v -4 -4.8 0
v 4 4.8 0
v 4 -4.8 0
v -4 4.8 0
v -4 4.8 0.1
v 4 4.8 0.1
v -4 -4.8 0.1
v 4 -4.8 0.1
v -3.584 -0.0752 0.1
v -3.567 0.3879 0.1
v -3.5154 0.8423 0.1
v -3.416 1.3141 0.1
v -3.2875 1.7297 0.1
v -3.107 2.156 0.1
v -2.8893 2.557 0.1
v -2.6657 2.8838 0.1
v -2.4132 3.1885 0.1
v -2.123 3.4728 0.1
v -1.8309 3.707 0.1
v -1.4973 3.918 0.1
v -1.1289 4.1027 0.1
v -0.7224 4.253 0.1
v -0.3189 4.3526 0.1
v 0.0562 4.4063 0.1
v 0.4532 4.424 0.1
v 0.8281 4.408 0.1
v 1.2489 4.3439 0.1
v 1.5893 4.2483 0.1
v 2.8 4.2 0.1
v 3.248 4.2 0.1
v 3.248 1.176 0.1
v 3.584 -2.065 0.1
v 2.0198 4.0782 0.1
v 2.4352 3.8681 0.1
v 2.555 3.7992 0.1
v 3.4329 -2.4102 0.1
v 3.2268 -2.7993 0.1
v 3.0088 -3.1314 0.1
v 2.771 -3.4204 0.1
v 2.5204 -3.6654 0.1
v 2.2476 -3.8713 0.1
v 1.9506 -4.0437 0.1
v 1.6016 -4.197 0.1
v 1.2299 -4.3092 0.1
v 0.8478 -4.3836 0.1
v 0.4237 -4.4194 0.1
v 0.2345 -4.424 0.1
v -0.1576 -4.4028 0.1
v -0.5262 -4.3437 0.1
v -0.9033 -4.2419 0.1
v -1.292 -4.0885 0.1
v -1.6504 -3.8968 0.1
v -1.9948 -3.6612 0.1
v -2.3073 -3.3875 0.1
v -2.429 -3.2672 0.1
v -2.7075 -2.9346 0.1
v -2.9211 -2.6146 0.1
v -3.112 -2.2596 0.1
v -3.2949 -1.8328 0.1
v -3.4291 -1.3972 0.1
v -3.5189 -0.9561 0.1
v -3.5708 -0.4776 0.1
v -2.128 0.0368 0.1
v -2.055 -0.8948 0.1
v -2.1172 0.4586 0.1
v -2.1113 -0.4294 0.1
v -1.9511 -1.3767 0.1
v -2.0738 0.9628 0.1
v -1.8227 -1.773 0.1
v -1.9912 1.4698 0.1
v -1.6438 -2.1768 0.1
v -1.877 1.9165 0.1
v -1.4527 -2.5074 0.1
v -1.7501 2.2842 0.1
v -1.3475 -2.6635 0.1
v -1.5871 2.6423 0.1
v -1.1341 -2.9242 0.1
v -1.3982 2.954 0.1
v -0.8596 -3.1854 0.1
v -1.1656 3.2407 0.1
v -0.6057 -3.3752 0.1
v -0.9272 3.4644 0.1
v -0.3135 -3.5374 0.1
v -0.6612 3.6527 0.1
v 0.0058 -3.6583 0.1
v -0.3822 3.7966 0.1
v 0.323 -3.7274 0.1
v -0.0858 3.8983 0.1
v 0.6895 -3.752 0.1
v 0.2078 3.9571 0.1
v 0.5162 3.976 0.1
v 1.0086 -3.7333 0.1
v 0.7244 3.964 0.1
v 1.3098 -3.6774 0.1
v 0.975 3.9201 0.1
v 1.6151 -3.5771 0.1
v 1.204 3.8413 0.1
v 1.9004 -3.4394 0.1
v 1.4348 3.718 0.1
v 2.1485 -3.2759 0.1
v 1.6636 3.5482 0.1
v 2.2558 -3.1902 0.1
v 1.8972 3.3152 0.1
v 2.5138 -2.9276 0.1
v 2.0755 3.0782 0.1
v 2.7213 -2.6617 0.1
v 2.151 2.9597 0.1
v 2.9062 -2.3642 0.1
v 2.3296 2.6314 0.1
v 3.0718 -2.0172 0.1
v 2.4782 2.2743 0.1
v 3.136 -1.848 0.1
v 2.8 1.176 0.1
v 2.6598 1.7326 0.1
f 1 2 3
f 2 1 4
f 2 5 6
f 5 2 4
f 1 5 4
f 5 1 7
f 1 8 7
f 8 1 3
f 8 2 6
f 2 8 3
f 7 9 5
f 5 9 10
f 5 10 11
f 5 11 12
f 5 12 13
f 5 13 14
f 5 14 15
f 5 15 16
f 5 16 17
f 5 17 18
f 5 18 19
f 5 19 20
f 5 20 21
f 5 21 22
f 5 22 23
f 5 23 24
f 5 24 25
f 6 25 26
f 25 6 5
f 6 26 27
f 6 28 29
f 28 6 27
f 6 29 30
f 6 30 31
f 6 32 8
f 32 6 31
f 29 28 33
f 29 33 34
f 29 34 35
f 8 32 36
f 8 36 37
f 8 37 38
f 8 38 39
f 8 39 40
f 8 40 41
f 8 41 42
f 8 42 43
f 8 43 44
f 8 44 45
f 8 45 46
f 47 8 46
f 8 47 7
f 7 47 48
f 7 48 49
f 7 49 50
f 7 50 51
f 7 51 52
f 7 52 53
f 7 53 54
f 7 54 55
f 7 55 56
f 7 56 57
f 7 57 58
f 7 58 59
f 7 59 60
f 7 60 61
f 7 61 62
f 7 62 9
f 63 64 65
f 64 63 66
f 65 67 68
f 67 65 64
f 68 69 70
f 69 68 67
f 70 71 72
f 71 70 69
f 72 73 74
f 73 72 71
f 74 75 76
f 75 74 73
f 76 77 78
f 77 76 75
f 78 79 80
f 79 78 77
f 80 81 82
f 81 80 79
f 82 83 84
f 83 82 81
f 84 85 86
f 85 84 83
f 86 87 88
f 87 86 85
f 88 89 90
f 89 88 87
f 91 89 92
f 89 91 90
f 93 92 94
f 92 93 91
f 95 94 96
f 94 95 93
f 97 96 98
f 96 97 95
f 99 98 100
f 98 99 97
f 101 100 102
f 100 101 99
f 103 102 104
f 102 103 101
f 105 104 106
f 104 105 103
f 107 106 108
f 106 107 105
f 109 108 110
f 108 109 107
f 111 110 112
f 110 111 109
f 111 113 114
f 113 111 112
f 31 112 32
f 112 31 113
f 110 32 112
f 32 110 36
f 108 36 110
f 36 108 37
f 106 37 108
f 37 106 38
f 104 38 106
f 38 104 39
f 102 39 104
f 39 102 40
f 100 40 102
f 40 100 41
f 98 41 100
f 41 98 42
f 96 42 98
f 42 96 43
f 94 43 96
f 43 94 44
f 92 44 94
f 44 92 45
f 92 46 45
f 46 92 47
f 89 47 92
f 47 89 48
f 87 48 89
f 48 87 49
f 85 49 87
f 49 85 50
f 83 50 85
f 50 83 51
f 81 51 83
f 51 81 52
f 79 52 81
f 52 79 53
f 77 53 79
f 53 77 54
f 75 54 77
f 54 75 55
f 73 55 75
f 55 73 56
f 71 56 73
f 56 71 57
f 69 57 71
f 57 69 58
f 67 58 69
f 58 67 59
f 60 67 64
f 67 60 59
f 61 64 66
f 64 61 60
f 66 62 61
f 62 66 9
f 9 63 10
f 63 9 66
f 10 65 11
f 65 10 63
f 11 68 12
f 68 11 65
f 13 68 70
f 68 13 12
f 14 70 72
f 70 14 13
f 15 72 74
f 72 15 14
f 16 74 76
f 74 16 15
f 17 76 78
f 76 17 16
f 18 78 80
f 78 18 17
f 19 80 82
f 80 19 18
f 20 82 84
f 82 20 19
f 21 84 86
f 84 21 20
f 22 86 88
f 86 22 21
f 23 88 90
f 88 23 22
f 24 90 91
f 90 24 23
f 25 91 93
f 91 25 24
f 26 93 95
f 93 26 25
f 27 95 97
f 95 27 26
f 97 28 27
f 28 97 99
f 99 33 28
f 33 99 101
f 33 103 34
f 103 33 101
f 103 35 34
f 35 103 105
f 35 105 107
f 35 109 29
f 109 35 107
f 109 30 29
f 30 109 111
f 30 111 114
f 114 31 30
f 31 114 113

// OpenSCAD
// file: ../p/box5-12.scad
use <../lib.scad>
function ldraw_lib__box5_12() = [
// 0 Box with 5 Faces without Any Edges
// 0 Name: box5-12.dat
// 0 Author: Chris Dee [cwdee]
// 0 !LDRAW_ORG Primitive UPDATE 2009-02
// 0 !LICENSE Licensed under CC BY 2.0 and CC BY 4.0 : see CAreadme.txt
// 
// 0 BFC CERTIFY CCW
  [0,"BFC","CERTIFY"],
  [0,"BFC","CCW"],
// 
// 0 !HISTORY 2009-09-03 [PTadmin] Official Update 2009-02
// 
// 
// 4 16 1 1 1 1 1 -1 -1 1 -1 -1 1 1
  [4,16,1,1,1,1,1,-1,-1,1,-1,-1,1,1],
// 4 16 -1 0 1 1 0 1 1 1 1 -1 1 1
  [4,16,-1,0,1,1,0,1,1,1,1,-1,1,1],
// 4 16 -1 0 -1 -1 0 1 -1 1 1 -1 1 -1
  [4,16,-1,0,-1,-1,0,1,-1,1,1,-1,1,-1],
// 4 16 1 0 -1 -1 0 -1 -1 1 -1 1 1 -1
  [4,16,1,0,-1,-1,0,-1,-1,1,-1,1,1,-1],
// 4 16 1 0 1 1 0 -1 1 1 -1 1 1 1
  [4,16,1,0,1,1,0,-1,1,1,-1,1,1,1],
// 0
];
makepoly(ldraw_lib__box5_12(), line=0.2);
// main file
use <../lib.scad>
use <../p/box5-12.scad>
function ldraw_lib__4162510d() = [
// 0 Sticker  1.2 x  1.0 with White "C" on Light Grey Background
// 0 Name: 4162510d.dat
// 0 Author: Massimo Maso [Sirio]
// 0 !LDRAW_ORG Part UPDATE 2022-05
// 0 !LICENSE Licensed under CC BY 2.0 and CC BY 4.0 : see CAreadme.txt
// 
// 0 BFC CERTIFY CCW
  [0,"BFC","CERTIFY"],
  [0,"BFC","CCW"],
// 
// 0 !KEYWORDS Biplane, Camel, Sculptures, Set 3451, Sopwith
// 
// 0 !HISTORY 2022-09-15 [PTadmin] Official Update 2022-05
// 
// 
// 0 // Primitives
// 1 16 0 -.25 0 10 0 0 0 .25 0 0 0 12 box5-12.dat
  [1,16,0,-.25,0,10,0,0,0,.25,0,0,0,12, ldraw_lib__box5_12()],
// 0 // Top faces
// 0 // Grey faces
// 3 7 -10 -.25 -12 -8.96 -.25 -.1881 -10 -.25 12
  [3,7,-10,-.25,-12,-8.96,-.25,-.1881,-10,-.25,12],
// 3 7 -10 -.25 12 -8.96 -.25 -.1881 -8.9175 -.25 .9698
  [3,7,-10,-.25,12,-8.96,-.25,-.1881,-8.9175,-.25,.9698],
// 3 7 -10 -.25 12 -8.9175 -.25 .9698 -8.7884 -.25 2.1057
  [3,7,-10,-.25,12,-8.9175,-.25,.9698,-8.7884,-.25,2.1057],
// 3 7 -10 -.25 12 -8.7884 -.25 2.1057 -8.5399 -.25 3.2852
  [3,7,-10,-.25,12,-8.7884,-.25,2.1057,-8.5399,-.25,3.2852],
// 3 7 -10 -.25 12 -8.5399 -.25 3.2852 -8.2188 -.25 4.3243
  [3,7,-10,-.25,12,-8.5399,-.25,3.2852,-8.2188,-.25,4.3243],
// 3 7 -10 -.25 12 -8.2188 -.25 4.3243 -7.7675 -.25 5.39
  [3,7,-10,-.25,12,-8.2188,-.25,4.3243,-7.7675,-.25,5.39],
// 3 7 -10 -.25 12 -7.7675 -.25 5.39 -7.2233 -.25 6.3924
  [3,7,-10,-.25,12,-7.7675,-.25,5.39,-7.2233,-.25,6.3924],
// 3 7 -10 -.25 12 -7.2233 -.25 6.3924 -6.6643 -.25 7.2094
  [3,7,-10,-.25,12,-7.2233,-.25,6.3924,-6.6643,-.25,7.2094],
// 3 7 -10 -.25 12 -6.6643 -.25 7.2094 -6.0331 -.25 7.9713
  [3,7,-10,-.25,12,-6.6643,-.25,7.2094,-6.0331,-.25,7.9713],
// 3 7 -10 -.25 12 -6.0331 -.25 7.9713 -5.3075 -.25 8.6821
  [3,7,-10,-.25,12,-6.0331,-.25,7.9713,-5.3075,-.25,8.6821],
// 3 7 -10 -.25 12 -5.3075 -.25 8.6821 -4.5773 -.25 9.2675
  [3,7,-10,-.25,12,-5.3075,-.25,8.6821,-4.5773,-.25,9.2675],
// 3 7 -10 -.25 12 -4.5773 -.25 9.2675 -3.7433 -.25 9.795
  [3,7,-10,-.25,12,-4.5773,-.25,9.2675,-3.7433,-.25,9.795],
// 3 7 -10 -.25 12 -3.7433 -.25 9.795 -2.8223 -.25 10.2567
  [3,7,-10,-.25,12,-3.7433,-.25,9.795,-2.8223,-.25,10.2567],
// 3 7 -10 -.25 12 -2.8223 -.25 10.2567 -1.8059 -.25 10.6326
  [3,7,-10,-.25,12,-2.8223,-.25,10.2567,-1.8059,-.25,10.6326],
// 3 7 -10 -.25 12 -1.8059 -.25 10.6326 -.7972 -.25 10.8814
  [3,7,-10,-.25,12,-1.8059,-.25,10.6326,-.7972,-.25,10.8814],
// 3 7 -10 -.25 12 -.7972 -.25 10.8814 .1406 -.25 11.0158
  [3,7,-10,-.25,12,-.7972,-.25,10.8814,.1406,-.25,11.0158],
// 3 7 -10 -.25 12 .1406 -.25 11.0158 1.1331 -.25 11.06
  [3,7,-10,-.25,12,.1406,-.25,11.0158,1.1331,-.25,11.06],
// 4 7 -10 -.25 12 1.1331 -.25 11.06 2.0703 -.25 11.0199 10 -.25 12
  [4,7,-10,-.25,12,1.1331,-.25,11.06,2.0703,-.25,11.0199,10,-.25,12],
// 3 7 10 -.25 12 2.0703 -.25 11.0199 3.1222 -.25 10.8597
  [3,7,10,-.25,12,2.0703,-.25,11.0199,3.1222,-.25,10.8597],
// 4 7 10 -.25 12 3.1222 -.25 10.8597 3.9733 -.25 10.6208 7 -.25 10.5
  [4,7,10,-.25,12,3.1222,-.25,10.8597,3.9733,-.25,10.6208,7,-.25,10.5],
// 3 7 10 -.25 12 7 -.25 10.5 8.12 -.25 10.5
  [3,7,10,-.25,12,7,-.25,10.5,8.12,-.25,10.5],
// 3 7 10 -.25 12 8.12 -.25 10.5 8.12 -.25 2.94
  [3,7,10,-.25,12,8.12,-.25,10.5,8.12,-.25,2.94],
// 4 7 10 -.25 12 8.12 -.25 2.94 8.96 -.25 -5.1625 10 -.25 -12
  [4,7,10,-.25,12,8.12,-.25,2.94,8.96,-.25,-5.1625,10,-.25,-12],
// 3 7 7 -.25 10.5 3.9733 -.25 10.6208 5.0494 -.25 10.1956
  [3,7,7,-.25,10.5,3.9733,-.25,10.6208,5.0494,-.25,10.1956],
// 3 7 7 -.25 10.5 5.0494 -.25 10.1956 6.088 -.25 9.6703
  [3,7,7,-.25,10.5,5.0494,-.25,10.1956,6.088,-.25,9.6703],
// 3 7 7 -.25 10.5 6.088 -.25 9.6703 6.3875 -.25 9.4981
  [3,7,7,-.25,10.5,6.088,-.25,9.6703,6.3875,-.25,9.4981],
// 3 7 10 -.25 -12 8.96 -.25 -5.1625 8.5822 -.25 -6.0256
  [3,7,10,-.25,-12,8.96,-.25,-5.1625,8.5822,-.25,-6.0256],
// 3 7 10 -.25 -12 8.5822 -.25 -6.0256 8.0669 -.25 -6.9983
  [3,7,10,-.25,-12,8.5822,-.25,-6.0256,8.0669,-.25,-6.9983],
// 3 7 10 -.25 -12 8.0669 -.25 -6.9983 7.5221 -.25 -7.8284
  [3,7,10,-.25,-12,8.0669,-.25,-6.9983,7.5221,-.25,-7.8284],
// 3 7 10 -.25 -12 7.5221 -.25 -7.8284 6.9275 -.25 -8.5509
  [3,7,10,-.25,-12,7.5221,-.25,-7.8284,6.9275,-.25,-8.5509],
// 3 7 10 -.25 -12 6.9275 -.25 -8.5509 6.3009 -.25 -9.1635
  [3,7,10,-.25,-12,6.9275,-.25,-8.5509,6.3009,-.25,-9.1635],
// 3 7 10 -.25 -12 6.3009 -.25 -9.1635 5.6191 -.25 -9.6783
  [3,7,10,-.25,-12,6.3009,-.25,-9.1635,5.6191,-.25,-9.6783],
// 3 7 10 -.25 -12 5.6191 -.25 -9.6783 4.8764 -.25 -10.1092
  [3,7,10,-.25,-12,5.6191,-.25,-9.6783,4.8764,-.25,-10.1092],
// 3 7 10 -.25 -12 4.8764 -.25 -10.1092 4.0039 -.25 -10.4925
  [3,7,10,-.25,-12,4.8764,-.25,-10.1092,4.0039,-.25,-10.4925],
// 3 7 10 -.25 -12 4.0039 -.25 -10.4925 3.0747 -.25 -10.773
  [3,7,10,-.25,-12,4.0039,-.25,-10.4925,3.0747,-.25,-10.773],
// 3 7 10 -.25 -12 3.0747 -.25 -10.773 2.1195 -.25 -10.9589
  [3,7,10,-.25,-12,3.0747,-.25,-10.773,2.1195,-.25,-10.9589],
// 3 7 10 -.25 -12 2.1195 -.25 -10.9589 1.0592 -.25 -11.0485
  [3,7,10,-.25,-12,2.1195,-.25,-10.9589,1.0592,-.25,-11.0485],
// 4 7 10 -.25 -12 1.0592 -.25 -11.0485 .5863 -.25 -11.06 -10 -.25 -12
  [4,7,10,-.25,-12,1.0592,-.25,-11.0485,.5863,-.25,-11.06,-10,-.25,-12],
// 3 7 -10 -.25 -12 .5863 -.25 -11.06 -.394 -.25 -11.0071
  [3,7,-10,-.25,-12,.5863,-.25,-11.06,-.394,-.25,-11.0071],
// 3 7 -10 -.25 -12 -.394 -.25 -11.0071 -1.3154 -.25 -10.8592
  [3,7,-10,-.25,-12,-.394,-.25,-11.0071,-1.3154,-.25,-10.8592],
// 3 7 -10 -.25 -12 -1.3154 -.25 -10.8592 -2.2583 -.25 -10.6047
  [3,7,-10,-.25,-12,-1.3154,-.25,-10.8592,-2.2583,-.25,-10.6047],
// 3 7 -10 -.25 -12 -2.2583 -.25 -10.6047 -3.2301 -.25 -10.2212
  [3,7,-10,-.25,-12,-2.2583,-.25,-10.6047,-3.2301,-.25,-10.2212],
// 3 7 -10 -.25 -12 -3.2301 -.25 -10.2212 -4.1261 -.25 -9.742
  [3,7,-10,-.25,-12,-3.2301,-.25,-10.2212,-4.1261,-.25,-9.742],
// 3 7 -10 -.25 -12 -4.1261 -.25 -9.742 -4.987 -.25 -9.153
  [3,7,-10,-.25,-12,-4.1261,-.25,-9.742,-4.987,-.25,-9.153],
// 3 7 -10 -.25 -12 -4.987 -.25 -9.153 -5.7683 -.25 -8.4688
  [3,7,-10,-.25,-12,-4.987,-.25,-9.153,-5.7683,-.25,-8.4688],
// 3 7 -10 -.25 -12 -5.7683 -.25 -8.4688 -6.0725 -.25 -8.1681
  [3,7,-10,-.25,-12,-5.7683,-.25,-8.4688,-6.0725,-.25,-8.1681],
// 3 7 -10 -.25 -12 -6.0725 -.25 -8.1681 -6.7687 -.25 -7.3364
  [3,7,-10,-.25,-12,-6.0725,-.25,-8.1681,-6.7687,-.25,-7.3364],
// 3 7 -10 -.25 -12 -6.7687 -.25 -7.3364 -7.3027 -.25 -6.5366
  [3,7,-10,-.25,-12,-6.7687,-.25,-7.3364,-7.3027,-.25,-6.5366],
// 3 7 -10 -.25 -12 -7.3027 -.25 -6.5366 -7.7799 -.25 -5.6489
  [3,7,-10,-.25,-12,-7.3027,-.25,-6.5366,-7.7799,-.25,-5.6489],
// 3 7 -10 -.25 -12 -7.7799 -.25 -5.6489 -8.2373 -.25 -4.5821
  [3,7,-10,-.25,-12,-7.7799,-.25,-5.6489,-8.2373,-.25,-4.5821],
// 3 7 -10 -.25 -12 -8.2373 -.25 -4.5821 -8.5727 -.25 -3.493
  [3,7,-10,-.25,-12,-8.2373,-.25,-4.5821,-8.5727,-.25,-3.493],
// 3 7 -10 -.25 -12 -8.5727 -.25 -3.493 -8.7972 -.25 -2.3903
  [3,7,-10,-.25,-12,-8.5727,-.25,-3.493,-8.7972,-.25,-2.3903],
// 3 7 -10 -.25 -12 -8.7972 -.25 -2.3903 -8.9271 -.25 -1.1939
  [3,7,-10,-.25,-12,-8.7972,-.25,-2.3903,-8.9271,-.25,-1.1939],
// 3 7 -10 -.25 -12 -8.9271 -.25 -1.1939 -8.96 -.25 -.1881
  [3,7,-10,-.25,-12,-8.9271,-.25,-1.1939,-8.96,-.25,-.1881],
// 4 7 -5.2931 -.25 1.1464 -5.32 -.25 .0919 -5.2783 -.25 -1.0734 -5.1375 -.25 -2.237
  [4,7,-5.2931,-.25,1.1464,-5.32,-.25,.0919,-5.2783,-.25,-1.0734,-5.1375,-.25,-2.237],
// 4 7 -5.2931 -.25 1.1464 -5.1375 -.25 -2.237 -4.8777 -.25 -3.4418 -5.1845 -.25 2.407
  [4,7,-5.2931,-.25,1.1464,-5.1375,-.25,-2.237,-4.8777,-.25,-3.4418,-5.1845,-.25,2.407],
// 4 7 -4.978 -.25 3.6744 -5.1845 -.25 2.407 -4.8777 -.25 -3.4418 -4.5568 -.25 -4.4325
  [4,7,-4.978,-.25,3.6744,-5.1845,-.25,2.407,-4.8777,-.25,-3.4418,-4.5568,-.25,-4.4325],
// 4 7 -4.978 -.25 3.6744 -4.5568 -.25 -4.4325 -4.1096 -.25 -5.442 -4.6926 -.25 4.7913
  [4,7,-4.978,-.25,3.6744,-4.5568,-.25,-4.4325,-4.1096,-.25,-5.442,-4.6926,-.25,4.7913],
// 4 7 -4.3753 -.25 5.7105 -4.6926 -.25 4.7913 -4.1096 -.25 -5.442 -3.6317 -.25 -6.2685
  [4,7,-4.3753,-.25,5.7105,-4.6926,-.25,4.7913,-4.1096,-.25,-5.442,-3.6317,-.25,-6.2685],
// 4 7 -4.3753 -.25 5.7105 -3.6317 -.25 -6.2685 -3.3688 -.25 -6.6588 -3.9677 -.25 6.6058
  [4,7,-4.3753,-.25,5.7105,-3.6317,-.25,-6.2685,-3.3688,-.25,-6.6588,-3.9677,-.25,6.6058],
// 4 7 -3.4956 -.25 7.385 -3.9677 -.25 6.6058 -3.3688 -.25 -6.6588 -2.8353 -.25 -7.3105
  [4,7,-3.4956,-.25,7.385,-3.9677,-.25,6.6058,-3.3688,-.25,-6.6588,-2.8353,-.25,-7.3105],
// 4 7 -3.4956 -.25 7.385 -2.8353 -.25 -7.3105 -2.1491 -.25 -7.9636 -2.9141 -.25 8.1017
  [4,7,-3.4956,-.25,7.385,-2.8353,-.25,-7.3105,-2.1491,-.25,-7.9636,-2.9141,-.25,8.1017],
// 4 7 -2.3181 -.25 8.661 -2.9141 -.25 8.1017 -2.1491 -.25 -7.9636 -1.5142 -.25 -8.438
  [4,7,-2.3181,-.25,8.661,-2.9141,-.25,8.1017,-2.1491,-.25,-7.9636,-1.5142,-.25,-8.438],
// 4 7 -2.3181 -.25 8.661 -1.5142 -.25 -8.438 -.7838 -.25 -8.8434 -1.6531 -.25 9.1317
  [4,7,-2.3181,-.25,8.661,-1.5142,-.25,-8.438,-.7838,-.25,-8.8434,-1.6531,-.25,9.1317],
// 4 7 -.9555 -.25 9.4914 -1.6531 -.25 9.1317 -.7838 -.25 -8.8434 .0145 -.25 -9.1458
  [4,7,-.9555,-.25,9.4914,-1.6531,-.25,9.1317,-.7838,-.25,-8.8434,.0145,-.25,-9.1458],
// 4 7 -.9555 -.25 9.4914 .0145 -.25 -9.1458 .8075 -.25 -9.3185 -.2145 -.25 9.7457
  [4,7,-.9555,-.25,9.4914,.0145,-.25,-9.1458,.8075,-.25,-9.3185,-.2145,-.25,9.7457],
// 4 7 .5194 -.25 9.8927 -.2145 -.25 9.7457 .8075 -.25 -9.3185 1.7238 -.25 -9.38
  [4,7,.5194,-.25,9.8927,-.2145,-.25,9.7457,.8075,-.25,-9.3185,1.7238,-.25,-9.38],
// 4 7 .5194 -.25 9.8927 1.7238 -.25 -9.38 2.5214 -.25 -9.3332 1.2906 -.25 9.94
  [4,7,.5194,-.25,9.8927,1.7238,-.25,-9.38,2.5214,-.25,-9.3332,1.2906,-.25,9.94],
// 4 7 1.8109 -.25 9.9099 1.2906 -.25 9.94 2.5214 -.25 -9.3332 3.2744 -.25 -9.1934
  [4,7,1.8109,-.25,9.9099,1.2906,-.25,9.94,2.5214,-.25,-9.3332,3.2744,-.25,-9.1934],
// 4 7 1.8109 -.25 9.9099 3.2744 -.25 -9.1934 4.0377 -.25 -8.9428 2.4376 -.25 9.8003
  [4,7,1.8109,-.25,9.9099,3.2744,-.25,-9.1934,4.0377,-.25,-8.9428,2.4376,-.25,9.8003],
// 4 7 3.01 -.25 9.6032 2.4376 -.25 9.8003 4.0377 -.25 -8.9428 4.7511 -.25 -8.5985
  [4,7,3.01,-.25,9.6032,2.4376,-.25,9.8003,4.0377,-.25,-8.9428,4.7511,-.25,-8.5985],
// 4 7 3.01 -.25 9.6032 4.7511 -.25 -8.5985 5.3712 -.25 -8.1897 3.587 -.25 9.2949
  [4,7,3.01,-.25,9.6032,4.7511,-.25,-8.5985,5.3712,-.25,-8.1897,3.587,-.25,9.2949],
// 4 7 4.159 -.25 8.8706 3.587 -.25 9.2949 5.3712 -.25 -8.1897 5.6394 -.25 -7.9756
  [4,7,4.159,-.25,8.8706,3.587,-.25,9.2949,5.3712,-.25,-8.1897,5.6394,-.25,-7.9756],
// 4 7 4.159 -.25 8.8706 5.6394 -.25 -7.9756 6.2846 -.25 -7.3191 4.743 -.25 8.288
  [4,7,4.159,-.25,8.8706,5.6394,-.25,-7.9756,6.2846,-.25,-7.3191,4.743,-.25,8.288],
// 4 7 5.1888 -.25 7.6956 4.743 -.25 8.288 6.2846 -.25 -7.3191 6.8033 -.25 -6.6543
  [4,7,5.1888,-.25,7.6956,4.743,-.25,8.288,6.2846,-.25,-7.3191,6.8033,-.25,-6.6543],
// 4 7 5.1888 -.25 7.6956 6.8033 -.25 -6.6543 7.2654 -.25 -5.9104 5.3776 -.25 7.3992
  [4,7,5.1888,-.25,7.6956,6.8033,-.25,-6.6543,7.2654,-.25,-5.9104,5.3776,-.25,7.3992],
// 4 7 5.824 -.25 6.5786 5.3776 -.25 7.3992 7.2654 -.25 -5.9104 7.6794 -.25 -5.0429
  [4,7,5.824,-.25,6.5786,5.3776,-.25,7.3992,7.2654,-.25,-5.9104,7.6794,-.25,-5.0429],
// 4 7 5.824 -.25 6.5786 7.6794 -.25 -5.0429 7.84 -.25 -4.62 6.1956 -.25 5.6857
  [4,7,5.824,-.25,6.5786,7.6794,-.25,-5.0429,7.84,-.25,-4.62,6.1956,-.25,5.6857],
// 4 7 7.84 -.25 -4.62 7 -.25 2.94 6.6494 -.25 4.3314 6.1956 -.25 5.6857
  [4,7,7.84,-.25,-4.62,7,-.25,2.94,6.6494,-.25,4.3314,6.1956,-.25,5.6857],
// 4 7 7.84 -.25 -4.62 8.96 -.25 -5.1625 8.12 -.25 2.94 7 -.25 2.94
  [4,7,7.84,-.25,-4.62,8.96,-.25,-5.1625,8.12,-.25,2.94,7,-.25,2.94],
// 0 // White faces
// 4 15 8.5822 -.25 -6.0256 8.96 -.25 -5.1625 7.84 -.25 -4.62 7.6794 -.25 -5.0429
  [4,15,8.5822,-.25,-6.0256,8.96,-.25,-5.1625,7.84,-.25,-4.62,7.6794,-.25,-5.0429],
// 4 15 8.5822 -.25 -6.0256 7.6794 -.25 -5.0429 7.2654 -.25 -5.9104 8.0669 -.25 -6.9983
  [4,15,8.5822,-.25,-6.0256,7.6794,-.25,-5.0429,7.2654,-.25,-5.9104,8.0669,-.25,-6.9983],
// 4 15 7.5221 -.25 -7.8284 8.0669 -.25 -6.9983 7.2654 -.25 -5.9104 6.8033 -.25 -6.6543
  [4,15,7.5221,-.25,-7.8284,8.0669,-.25,-6.9983,7.2654,-.25,-5.9104,6.8033,-.25,-6.6543],
// 4 15 7.5221 -.25 -7.8284 6.8033 -.25 -6.6543 6.2846 -.25 -7.3191 6.9275 -.25 -8.5509
  [4,15,7.5221,-.25,-7.8284,6.8033,-.25,-6.6543,6.2846,-.25,-7.3191,6.9275,-.25,-8.5509],
// 4 15 6.3009 -.25 -9.1635 6.9275 -.25 -8.5509 6.2846 -.25 -7.3191 5.6394 -.25 -7.9756
  [4,15,6.3009,-.25,-9.1635,6.9275,-.25,-8.5509,6.2846,-.25,-7.3191,5.6394,-.25,-7.9756],
// 4 15 6.3009 -.25 -9.1635 5.6394 -.25 -7.9756 5.3712 -.25 -8.1897 5.6191 -.25 -9.6783
  [4,15,6.3009,-.25,-9.1635,5.6394,-.25,-7.9756,5.3712,-.25,-8.1897,5.6191,-.25,-9.6783],
// 4 15 4.8764 -.25 -10.1092 5.6191 -.25 -9.6783 5.3712 -.25 -8.1897 4.7511 -.25 -8.5985
  [4,15,4.8764,-.25,-10.1092,5.6191,-.25,-9.6783,5.3712,-.25,-8.1897,4.7511,-.25,-8.5985],
// 4 15 4.8764 -.25 -10.1092 4.7511 -.25 -8.5985 4.0377 -.25 -8.9428 4.0039 -.25 -10.4925
  [4,15,4.8764,-.25,-10.1092,4.7511,-.25,-8.5985,4.0377,-.25,-8.9428,4.0039,-.25,-10.4925],
// 4 15 3.0747 -.25 -10.773 4.0039 -.25 -10.4925 4.0377 -.25 -8.9428 3.2744 -.25 -9.1934
  [4,15,3.0747,-.25,-10.773,4.0039,-.25,-10.4925,4.0377,-.25,-8.9428,3.2744,-.25,-9.1934],
// 4 15 3.0747 -.25 -10.773 3.2744 -.25 -9.1934 2.5214 -.25 -9.3332 2.1195 -.25 -10.9589
  [4,15,3.0747,-.25,-10.773,3.2744,-.25,-9.1934,2.5214,-.25,-9.3332,2.1195,-.25,-10.9589],
// 4 15 2.5214 -.25 -9.3332 .5863 -.25 -11.06 1.0592 -.25 -11.0485 2.1195 -.25 -10.9589
  [4,15,2.5214,-.25,-9.3332,.5863,-.25,-11.06,1.0592,-.25,-11.0485,2.1195,-.25,-10.9589],
// 4 15 -.394 -.25 -11.0071 .5863 -.25 -11.06 2.5214 -.25 -9.3332 1.7238 -.25 -9.38
  [4,15,-.394,-.25,-11.0071,.5863,-.25,-11.06,2.5214,-.25,-9.3332,1.7238,-.25,-9.38],
// 4 15 -.394 -.25 -11.0071 1.7238 -.25 -9.38 .8075 -.25 -9.3185 -1.3154 -.25 -10.8592
  [4,15,-.394,-.25,-11.0071,1.7238,-.25,-9.38,.8075,-.25,-9.3185,-1.3154,-.25,-10.8592],
// 4 15 -2.2583 -.25 -10.6047 -1.3154 -.25 -10.8592 .8075 -.25 -9.3185 .0145 -.25 -9.1458
  [4,15,-2.2583,-.25,-10.6047,-1.3154,-.25,-10.8592,.8075,-.25,-9.3185,.0145,-.25,-9.1458],
// 4 15 -2.2583 -.25 -10.6047 .0145 -.25 -9.1458 -.7838 -.25 -8.8434 -3.2301 -.25 -10.2212
  [4,15,-2.2583,-.25,-10.6047,.0145,-.25,-9.1458,-.7838,-.25,-8.8434,-3.2301,-.25,-10.2212],
// 4 15 -4.1261 -.25 -9.742 -3.2301 -.25 -10.2212 -.7838 -.25 -8.8434 -1.5142 -.25 -8.438
  [4,15,-4.1261,-.25,-9.742,-3.2301,-.25,-10.2212,-.7838,-.25,-8.8434,-1.5142,-.25,-8.438],
// 4 15 -4.1261 -.25 -9.742 -1.5142 -.25 -8.438 -2.1491 -.25 -7.9636 -4.987 -.25 -9.153
  [4,15,-4.1261,-.25,-9.742,-1.5142,-.25,-8.438,-2.1491,-.25,-7.9636,-4.987,-.25,-9.153],
// 4 15 -5.7683 -.25 -8.4688 -4.987 -.25 -9.153 -2.1491 -.25 -7.9636 -2.8353 -.25 -7.3105
  [4,15,-5.7683,-.25,-8.4688,-4.987,-.25,-9.153,-2.1491,-.25,-7.9636,-2.8353,-.25,-7.3105],
// 4 15 -5.7683 -.25 -8.4688 -2.8353 -.25 -7.3105 -3.3688 -.25 -6.6588 -6.0725 -.25 -8.1681
  [4,15,-5.7683,-.25,-8.4688,-2.8353,-.25,-7.3105,-3.3688,-.25,-6.6588,-6.0725,-.25,-8.1681],
// 4 15 -6.7687 -.25 -7.3364 -6.0725 -.25 -8.1681 -3.3688 -.25 -6.6588 -3.6317 -.25 -6.2685
  [4,15,-6.7687,-.25,-7.3364,-6.0725,-.25,-8.1681,-3.3688,-.25,-6.6588,-3.6317,-.25,-6.2685],
// 4 15 -6.7687 -.25 -7.3364 -3.6317 -.25 -6.2685 -4.1096 -.25 -5.442 -7.3027 -.25 -6.5366
  [4,15,-6.7687,-.25,-7.3364,-3.6317,-.25,-6.2685,-4.1096,-.25,-5.442,-7.3027,-.25,-6.5366],
// 4 15 -7.7799 -.25 -5.6489 -7.3027 -.25 -6.5366 -4.1096 -.25 -5.442 -4.5568 -.25 -4.4325
  [4,15,-7.7799,-.25,-5.6489,-7.3027,-.25,-6.5366,-4.1096,-.25,-5.442,-4.5568,-.25,-4.4325],
// 4 15 -7.7799 -.25 -5.6489 -4.5568 -.25 -4.4325 -4.8777 -.25 -3.4418 -8.2373 -.25 -4.5821
  [4,15,-7.7799,-.25,-5.6489,-4.5568,-.25,-4.4325,-4.8777,-.25,-3.4418,-8.2373,-.25,-4.5821],
// 4 15 -8.5727 -.25 -3.493 -8.2373 -.25 -4.5821 -4.8777 -.25 -3.4418 -5.1375 -.25 -2.237
  [4,15,-8.5727,-.25,-3.493,-8.2373,-.25,-4.5821,-4.8777,-.25,-3.4418,-5.1375,-.25,-2.237],
// 4 15 -8.5727 -.25 -3.493 -5.1375 -.25 -2.237 -5.2783 -.25 -1.0734 -8.7972 -.25 -2.3903
  [4,15,-8.5727,-.25,-3.493,-5.1375,-.25,-2.237,-5.2783,-.25,-1.0734,-8.7972,-.25,-2.3903],
// 4 15 -5.2783 -.25 -1.0734 -8.96 -.25 -.1881 -8.9271 -.25 -1.1939 -8.7972 -.25 -2.3903
  [4,15,-5.2783,-.25,-1.0734,-8.96,-.25,-.1881,-8.9271,-.25,-1.1939,-8.7972,-.25,-2.3903],
// 4 15 -8.9175 -.25 .9698 -8.96 -.25 -.1881 -5.2783 -.25 -1.0734 -5.32 -.25 .0919
  [4,15,-8.9175,-.25,.9698,-8.96,-.25,-.1881,-5.2783,-.25,-1.0734,-5.32,-.25,.0919],
// 4 15 -8.9175 -.25 .9698 -5.32 -.25 .0919 -5.2931 -.25 1.1464 -8.7884 -.25 2.1057
  [4,15,-8.9175,-.25,.9698,-5.32,-.25,.0919,-5.2931,-.25,1.1464,-8.7884,-.25,2.1057],
// 4 15 -8.5399 -.25 3.2852 -8.7884 -.25 2.1057 -5.2931 -.25 1.1464 -5.1845 -.25 2.407
  [4,15,-8.5399,-.25,3.2852,-8.7884,-.25,2.1057,-5.2931,-.25,1.1464,-5.1845,-.25,2.407],
// 4 15 -8.5399 -.25 3.2852 -5.1845 -.25 2.407 -4.978 -.25 3.6744 -8.2188 -.25 4.3243
  [4,15,-8.5399,-.25,3.2852,-5.1845,-.25,2.407,-4.978,-.25,3.6744,-8.2188,-.25,4.3243],
// 4 15 -7.7675 -.25 5.39 -8.2188 -.25 4.3243 -4.978 -.25 3.6744 -4.6926 -.25 4.7913
  [4,15,-7.7675,-.25,5.39,-8.2188,-.25,4.3243,-4.978,-.25,3.6744,-4.6926,-.25,4.7913],
// 4 15 -7.7675 -.25 5.39 -4.6926 -.25 4.7913 -4.3753 -.25 5.7105 -7.2233 -.25 6.3924
  [4,15,-7.7675,-.25,5.39,-4.6926,-.25,4.7913,-4.3753,-.25,5.7105,-7.2233,-.25,6.3924],
// 4 15 -6.6643 -.25 7.2094 -7.2233 -.25 6.3924 -4.3753 -.25 5.7105 -3.9677 -.25 6.6058
  [4,15,-6.6643,-.25,7.2094,-7.2233,-.25,6.3924,-4.3753,-.25,5.7105,-3.9677,-.25,6.6058],
// 4 15 -6.6643 -.25 7.2094 -3.9677 -.25 6.6058 -3.4956 -.25 7.385 -6.0331 -.25 7.9713
  [4,15,-6.6643,-.25,7.2094,-3.9677,-.25,6.6058,-3.4956,-.25,7.385,-6.0331,-.25,7.9713],
// 4 15 -5.3075 -.25 8.6821 -6.0331 -.25 7.9713 -3.4956 -.25 7.385 -2.9141 -.25 8.1017
  [4,15,-5.3075,-.25,8.6821,-6.0331,-.25,7.9713,-3.4956,-.25,7.385,-2.9141,-.25,8.1017],
// 4 15 -5.3075 -.25 8.6821 -2.9141 -.25 8.1017 -2.3181 -.25 8.661 -4.5773 -.25 9.2675
  [4,15,-5.3075,-.25,8.6821,-2.9141,-.25,8.1017,-2.3181,-.25,8.661,-4.5773,-.25,9.2675],
// 4 15 -3.7433 -.25 9.795 -4.5773 -.25 9.2675 -2.3181 -.25 8.661 -1.6531 -.25 9.1317
  [4,15,-3.7433,-.25,9.795,-4.5773,-.25,9.2675,-2.3181,-.25,8.661,-1.6531,-.25,9.1317],
// 4 15 -3.7433 -.25 9.795 -1.6531 -.25 9.1317 -.9555 -.25 9.4914 -2.8223 -.25 10.2567
  [4,15,-3.7433,-.25,9.795,-1.6531,-.25,9.1317,-.9555,-.25,9.4914,-2.8223,-.25,10.2567],
// 4 15 -1.8059 -.25 10.6326 -2.8223 -.25 10.2567 -.9555 -.25 9.4914 -.2145 -.25 9.7457
  [4,15,-1.8059,-.25,10.6326,-2.8223,-.25,10.2567,-.9555,-.25,9.4914,-.2145,-.25,9.7457],
// 4 15 -1.8059 -.25 10.6326 -.2145 -.25 9.7457 .5194 -.25 9.8927 -.7972 -.25 10.8814
  [4,15,-1.8059,-.25,10.6326,-.2145,-.25,9.7457,.5194,-.25,9.8927,-.7972,-.25,10.8814],
// 4 15 .1406 -.25 11.0158 -.7972 -.25 10.8814 .5194 -.25 9.8927 1.2906 -.25 9.94
  [4,15,.1406,-.25,11.0158,-.7972,-.25,10.8814,.5194,-.25,9.8927,1.2906,-.25,9.94],
// 4 15 .1406 -.25 11.0158 1.2906 -.25 9.94 1.8109 -.25 9.9099 1.1331 -.25 11.06
  [4,15,.1406,-.25,11.0158,1.2906,-.25,9.94,1.8109,-.25,9.9099,1.1331,-.25,11.06],
// 4 15 2.0703 -.25 11.0199 1.1331 -.25 11.06 1.8109 -.25 9.9099 2.4376 -.25 9.8003
  [4,15,2.0703,-.25,11.0199,1.1331,-.25,11.06,1.8109,-.25,9.9099,2.4376,-.25,9.8003],
// 4 15 2.0703 -.25 11.0199 2.4376 -.25 9.8003 3.01 -.25 9.6032 3.1222 -.25 10.8597
  [4,15,2.0703,-.25,11.0199,2.4376,-.25,9.8003,3.01,-.25,9.6032,3.1222,-.25,10.8597],
// 4 15 3.9733 -.25 10.6208 3.1222 -.25 10.8597 3.01 -.25 9.6032 3.587 -.25 9.2949
  [4,15,3.9733,-.25,10.6208,3.1222,-.25,10.8597,3.01,-.25,9.6032,3.587,-.25,9.2949],
// 4 15 3.9733 -.25 10.6208 3.587 -.25 9.2949 4.159 -.25 8.8706 5.0494 -.25 10.1956
  [4,15,3.9733,-.25,10.6208,3.587,-.25,9.2949,4.159,-.25,8.8706,5.0494,-.25,10.1956],
// 4 15 6.088 -.25 9.6703 5.0494 -.25 10.1956 4.159 -.25 8.8706 4.743 -.25 8.288
  [4,15,6.088,-.25,9.6703,5.0494,-.25,10.1956,4.159,-.25,8.8706,4.743,-.25,8.288],
// 4 15 6.088 -.25 9.6703 4.743 -.25 8.288 5.1888 -.25 7.6956 6.3875 -.25 9.4981
  [4,15,6.088,-.25,9.6703,4.743,-.25,8.288,5.1888,-.25,7.6956,6.3875,-.25,9.4981],
// 3 15 6.3875 -.25 9.4981 5.1888 -.25 7.6956 5.3776 -.25 7.3992
  [3,15,6.3875,-.25,9.4981,5.1888,-.25,7.6956,5.3776,-.25,7.3992],
// 4 15 6.3875 -.25 9.4981 5.3776 -.25 7.3992 5.824 -.25 6.5786 7 -.25 10.5
  [4,15,6.3875,-.25,9.4981,5.3776,-.25,7.3992,5.824,-.25,6.5786,7,-.25,10.5],
// 4 15 8.12 -.25 10.5 7 -.25 10.5 5.824 -.25 6.5786 6.1956 -.25 5.6857
  [4,15,8.12,-.25,10.5,7,-.25,10.5,5.824,-.25,6.5786,6.1956,-.25,5.6857],
// 3 15 8.12 -.25 10.5 6.1956 -.25 5.6857 6.6494 -.25 4.3314
  [3,15,8.12,-.25,10.5,6.1956,-.25,5.6857,6.6494,-.25,4.3314],
// 4 15 8.12 -.25 10.5 6.6494 -.25 4.3314 7 -.25 2.94 8.12 -.25 2.94
  [4,15,8.12,-.25,10.5,6.6494,-.25,4.3314,7,-.25,2.94,8.12,-.25,2.94],
];
makepoly(ldraw_lib__4162510d(), line=0.2);
